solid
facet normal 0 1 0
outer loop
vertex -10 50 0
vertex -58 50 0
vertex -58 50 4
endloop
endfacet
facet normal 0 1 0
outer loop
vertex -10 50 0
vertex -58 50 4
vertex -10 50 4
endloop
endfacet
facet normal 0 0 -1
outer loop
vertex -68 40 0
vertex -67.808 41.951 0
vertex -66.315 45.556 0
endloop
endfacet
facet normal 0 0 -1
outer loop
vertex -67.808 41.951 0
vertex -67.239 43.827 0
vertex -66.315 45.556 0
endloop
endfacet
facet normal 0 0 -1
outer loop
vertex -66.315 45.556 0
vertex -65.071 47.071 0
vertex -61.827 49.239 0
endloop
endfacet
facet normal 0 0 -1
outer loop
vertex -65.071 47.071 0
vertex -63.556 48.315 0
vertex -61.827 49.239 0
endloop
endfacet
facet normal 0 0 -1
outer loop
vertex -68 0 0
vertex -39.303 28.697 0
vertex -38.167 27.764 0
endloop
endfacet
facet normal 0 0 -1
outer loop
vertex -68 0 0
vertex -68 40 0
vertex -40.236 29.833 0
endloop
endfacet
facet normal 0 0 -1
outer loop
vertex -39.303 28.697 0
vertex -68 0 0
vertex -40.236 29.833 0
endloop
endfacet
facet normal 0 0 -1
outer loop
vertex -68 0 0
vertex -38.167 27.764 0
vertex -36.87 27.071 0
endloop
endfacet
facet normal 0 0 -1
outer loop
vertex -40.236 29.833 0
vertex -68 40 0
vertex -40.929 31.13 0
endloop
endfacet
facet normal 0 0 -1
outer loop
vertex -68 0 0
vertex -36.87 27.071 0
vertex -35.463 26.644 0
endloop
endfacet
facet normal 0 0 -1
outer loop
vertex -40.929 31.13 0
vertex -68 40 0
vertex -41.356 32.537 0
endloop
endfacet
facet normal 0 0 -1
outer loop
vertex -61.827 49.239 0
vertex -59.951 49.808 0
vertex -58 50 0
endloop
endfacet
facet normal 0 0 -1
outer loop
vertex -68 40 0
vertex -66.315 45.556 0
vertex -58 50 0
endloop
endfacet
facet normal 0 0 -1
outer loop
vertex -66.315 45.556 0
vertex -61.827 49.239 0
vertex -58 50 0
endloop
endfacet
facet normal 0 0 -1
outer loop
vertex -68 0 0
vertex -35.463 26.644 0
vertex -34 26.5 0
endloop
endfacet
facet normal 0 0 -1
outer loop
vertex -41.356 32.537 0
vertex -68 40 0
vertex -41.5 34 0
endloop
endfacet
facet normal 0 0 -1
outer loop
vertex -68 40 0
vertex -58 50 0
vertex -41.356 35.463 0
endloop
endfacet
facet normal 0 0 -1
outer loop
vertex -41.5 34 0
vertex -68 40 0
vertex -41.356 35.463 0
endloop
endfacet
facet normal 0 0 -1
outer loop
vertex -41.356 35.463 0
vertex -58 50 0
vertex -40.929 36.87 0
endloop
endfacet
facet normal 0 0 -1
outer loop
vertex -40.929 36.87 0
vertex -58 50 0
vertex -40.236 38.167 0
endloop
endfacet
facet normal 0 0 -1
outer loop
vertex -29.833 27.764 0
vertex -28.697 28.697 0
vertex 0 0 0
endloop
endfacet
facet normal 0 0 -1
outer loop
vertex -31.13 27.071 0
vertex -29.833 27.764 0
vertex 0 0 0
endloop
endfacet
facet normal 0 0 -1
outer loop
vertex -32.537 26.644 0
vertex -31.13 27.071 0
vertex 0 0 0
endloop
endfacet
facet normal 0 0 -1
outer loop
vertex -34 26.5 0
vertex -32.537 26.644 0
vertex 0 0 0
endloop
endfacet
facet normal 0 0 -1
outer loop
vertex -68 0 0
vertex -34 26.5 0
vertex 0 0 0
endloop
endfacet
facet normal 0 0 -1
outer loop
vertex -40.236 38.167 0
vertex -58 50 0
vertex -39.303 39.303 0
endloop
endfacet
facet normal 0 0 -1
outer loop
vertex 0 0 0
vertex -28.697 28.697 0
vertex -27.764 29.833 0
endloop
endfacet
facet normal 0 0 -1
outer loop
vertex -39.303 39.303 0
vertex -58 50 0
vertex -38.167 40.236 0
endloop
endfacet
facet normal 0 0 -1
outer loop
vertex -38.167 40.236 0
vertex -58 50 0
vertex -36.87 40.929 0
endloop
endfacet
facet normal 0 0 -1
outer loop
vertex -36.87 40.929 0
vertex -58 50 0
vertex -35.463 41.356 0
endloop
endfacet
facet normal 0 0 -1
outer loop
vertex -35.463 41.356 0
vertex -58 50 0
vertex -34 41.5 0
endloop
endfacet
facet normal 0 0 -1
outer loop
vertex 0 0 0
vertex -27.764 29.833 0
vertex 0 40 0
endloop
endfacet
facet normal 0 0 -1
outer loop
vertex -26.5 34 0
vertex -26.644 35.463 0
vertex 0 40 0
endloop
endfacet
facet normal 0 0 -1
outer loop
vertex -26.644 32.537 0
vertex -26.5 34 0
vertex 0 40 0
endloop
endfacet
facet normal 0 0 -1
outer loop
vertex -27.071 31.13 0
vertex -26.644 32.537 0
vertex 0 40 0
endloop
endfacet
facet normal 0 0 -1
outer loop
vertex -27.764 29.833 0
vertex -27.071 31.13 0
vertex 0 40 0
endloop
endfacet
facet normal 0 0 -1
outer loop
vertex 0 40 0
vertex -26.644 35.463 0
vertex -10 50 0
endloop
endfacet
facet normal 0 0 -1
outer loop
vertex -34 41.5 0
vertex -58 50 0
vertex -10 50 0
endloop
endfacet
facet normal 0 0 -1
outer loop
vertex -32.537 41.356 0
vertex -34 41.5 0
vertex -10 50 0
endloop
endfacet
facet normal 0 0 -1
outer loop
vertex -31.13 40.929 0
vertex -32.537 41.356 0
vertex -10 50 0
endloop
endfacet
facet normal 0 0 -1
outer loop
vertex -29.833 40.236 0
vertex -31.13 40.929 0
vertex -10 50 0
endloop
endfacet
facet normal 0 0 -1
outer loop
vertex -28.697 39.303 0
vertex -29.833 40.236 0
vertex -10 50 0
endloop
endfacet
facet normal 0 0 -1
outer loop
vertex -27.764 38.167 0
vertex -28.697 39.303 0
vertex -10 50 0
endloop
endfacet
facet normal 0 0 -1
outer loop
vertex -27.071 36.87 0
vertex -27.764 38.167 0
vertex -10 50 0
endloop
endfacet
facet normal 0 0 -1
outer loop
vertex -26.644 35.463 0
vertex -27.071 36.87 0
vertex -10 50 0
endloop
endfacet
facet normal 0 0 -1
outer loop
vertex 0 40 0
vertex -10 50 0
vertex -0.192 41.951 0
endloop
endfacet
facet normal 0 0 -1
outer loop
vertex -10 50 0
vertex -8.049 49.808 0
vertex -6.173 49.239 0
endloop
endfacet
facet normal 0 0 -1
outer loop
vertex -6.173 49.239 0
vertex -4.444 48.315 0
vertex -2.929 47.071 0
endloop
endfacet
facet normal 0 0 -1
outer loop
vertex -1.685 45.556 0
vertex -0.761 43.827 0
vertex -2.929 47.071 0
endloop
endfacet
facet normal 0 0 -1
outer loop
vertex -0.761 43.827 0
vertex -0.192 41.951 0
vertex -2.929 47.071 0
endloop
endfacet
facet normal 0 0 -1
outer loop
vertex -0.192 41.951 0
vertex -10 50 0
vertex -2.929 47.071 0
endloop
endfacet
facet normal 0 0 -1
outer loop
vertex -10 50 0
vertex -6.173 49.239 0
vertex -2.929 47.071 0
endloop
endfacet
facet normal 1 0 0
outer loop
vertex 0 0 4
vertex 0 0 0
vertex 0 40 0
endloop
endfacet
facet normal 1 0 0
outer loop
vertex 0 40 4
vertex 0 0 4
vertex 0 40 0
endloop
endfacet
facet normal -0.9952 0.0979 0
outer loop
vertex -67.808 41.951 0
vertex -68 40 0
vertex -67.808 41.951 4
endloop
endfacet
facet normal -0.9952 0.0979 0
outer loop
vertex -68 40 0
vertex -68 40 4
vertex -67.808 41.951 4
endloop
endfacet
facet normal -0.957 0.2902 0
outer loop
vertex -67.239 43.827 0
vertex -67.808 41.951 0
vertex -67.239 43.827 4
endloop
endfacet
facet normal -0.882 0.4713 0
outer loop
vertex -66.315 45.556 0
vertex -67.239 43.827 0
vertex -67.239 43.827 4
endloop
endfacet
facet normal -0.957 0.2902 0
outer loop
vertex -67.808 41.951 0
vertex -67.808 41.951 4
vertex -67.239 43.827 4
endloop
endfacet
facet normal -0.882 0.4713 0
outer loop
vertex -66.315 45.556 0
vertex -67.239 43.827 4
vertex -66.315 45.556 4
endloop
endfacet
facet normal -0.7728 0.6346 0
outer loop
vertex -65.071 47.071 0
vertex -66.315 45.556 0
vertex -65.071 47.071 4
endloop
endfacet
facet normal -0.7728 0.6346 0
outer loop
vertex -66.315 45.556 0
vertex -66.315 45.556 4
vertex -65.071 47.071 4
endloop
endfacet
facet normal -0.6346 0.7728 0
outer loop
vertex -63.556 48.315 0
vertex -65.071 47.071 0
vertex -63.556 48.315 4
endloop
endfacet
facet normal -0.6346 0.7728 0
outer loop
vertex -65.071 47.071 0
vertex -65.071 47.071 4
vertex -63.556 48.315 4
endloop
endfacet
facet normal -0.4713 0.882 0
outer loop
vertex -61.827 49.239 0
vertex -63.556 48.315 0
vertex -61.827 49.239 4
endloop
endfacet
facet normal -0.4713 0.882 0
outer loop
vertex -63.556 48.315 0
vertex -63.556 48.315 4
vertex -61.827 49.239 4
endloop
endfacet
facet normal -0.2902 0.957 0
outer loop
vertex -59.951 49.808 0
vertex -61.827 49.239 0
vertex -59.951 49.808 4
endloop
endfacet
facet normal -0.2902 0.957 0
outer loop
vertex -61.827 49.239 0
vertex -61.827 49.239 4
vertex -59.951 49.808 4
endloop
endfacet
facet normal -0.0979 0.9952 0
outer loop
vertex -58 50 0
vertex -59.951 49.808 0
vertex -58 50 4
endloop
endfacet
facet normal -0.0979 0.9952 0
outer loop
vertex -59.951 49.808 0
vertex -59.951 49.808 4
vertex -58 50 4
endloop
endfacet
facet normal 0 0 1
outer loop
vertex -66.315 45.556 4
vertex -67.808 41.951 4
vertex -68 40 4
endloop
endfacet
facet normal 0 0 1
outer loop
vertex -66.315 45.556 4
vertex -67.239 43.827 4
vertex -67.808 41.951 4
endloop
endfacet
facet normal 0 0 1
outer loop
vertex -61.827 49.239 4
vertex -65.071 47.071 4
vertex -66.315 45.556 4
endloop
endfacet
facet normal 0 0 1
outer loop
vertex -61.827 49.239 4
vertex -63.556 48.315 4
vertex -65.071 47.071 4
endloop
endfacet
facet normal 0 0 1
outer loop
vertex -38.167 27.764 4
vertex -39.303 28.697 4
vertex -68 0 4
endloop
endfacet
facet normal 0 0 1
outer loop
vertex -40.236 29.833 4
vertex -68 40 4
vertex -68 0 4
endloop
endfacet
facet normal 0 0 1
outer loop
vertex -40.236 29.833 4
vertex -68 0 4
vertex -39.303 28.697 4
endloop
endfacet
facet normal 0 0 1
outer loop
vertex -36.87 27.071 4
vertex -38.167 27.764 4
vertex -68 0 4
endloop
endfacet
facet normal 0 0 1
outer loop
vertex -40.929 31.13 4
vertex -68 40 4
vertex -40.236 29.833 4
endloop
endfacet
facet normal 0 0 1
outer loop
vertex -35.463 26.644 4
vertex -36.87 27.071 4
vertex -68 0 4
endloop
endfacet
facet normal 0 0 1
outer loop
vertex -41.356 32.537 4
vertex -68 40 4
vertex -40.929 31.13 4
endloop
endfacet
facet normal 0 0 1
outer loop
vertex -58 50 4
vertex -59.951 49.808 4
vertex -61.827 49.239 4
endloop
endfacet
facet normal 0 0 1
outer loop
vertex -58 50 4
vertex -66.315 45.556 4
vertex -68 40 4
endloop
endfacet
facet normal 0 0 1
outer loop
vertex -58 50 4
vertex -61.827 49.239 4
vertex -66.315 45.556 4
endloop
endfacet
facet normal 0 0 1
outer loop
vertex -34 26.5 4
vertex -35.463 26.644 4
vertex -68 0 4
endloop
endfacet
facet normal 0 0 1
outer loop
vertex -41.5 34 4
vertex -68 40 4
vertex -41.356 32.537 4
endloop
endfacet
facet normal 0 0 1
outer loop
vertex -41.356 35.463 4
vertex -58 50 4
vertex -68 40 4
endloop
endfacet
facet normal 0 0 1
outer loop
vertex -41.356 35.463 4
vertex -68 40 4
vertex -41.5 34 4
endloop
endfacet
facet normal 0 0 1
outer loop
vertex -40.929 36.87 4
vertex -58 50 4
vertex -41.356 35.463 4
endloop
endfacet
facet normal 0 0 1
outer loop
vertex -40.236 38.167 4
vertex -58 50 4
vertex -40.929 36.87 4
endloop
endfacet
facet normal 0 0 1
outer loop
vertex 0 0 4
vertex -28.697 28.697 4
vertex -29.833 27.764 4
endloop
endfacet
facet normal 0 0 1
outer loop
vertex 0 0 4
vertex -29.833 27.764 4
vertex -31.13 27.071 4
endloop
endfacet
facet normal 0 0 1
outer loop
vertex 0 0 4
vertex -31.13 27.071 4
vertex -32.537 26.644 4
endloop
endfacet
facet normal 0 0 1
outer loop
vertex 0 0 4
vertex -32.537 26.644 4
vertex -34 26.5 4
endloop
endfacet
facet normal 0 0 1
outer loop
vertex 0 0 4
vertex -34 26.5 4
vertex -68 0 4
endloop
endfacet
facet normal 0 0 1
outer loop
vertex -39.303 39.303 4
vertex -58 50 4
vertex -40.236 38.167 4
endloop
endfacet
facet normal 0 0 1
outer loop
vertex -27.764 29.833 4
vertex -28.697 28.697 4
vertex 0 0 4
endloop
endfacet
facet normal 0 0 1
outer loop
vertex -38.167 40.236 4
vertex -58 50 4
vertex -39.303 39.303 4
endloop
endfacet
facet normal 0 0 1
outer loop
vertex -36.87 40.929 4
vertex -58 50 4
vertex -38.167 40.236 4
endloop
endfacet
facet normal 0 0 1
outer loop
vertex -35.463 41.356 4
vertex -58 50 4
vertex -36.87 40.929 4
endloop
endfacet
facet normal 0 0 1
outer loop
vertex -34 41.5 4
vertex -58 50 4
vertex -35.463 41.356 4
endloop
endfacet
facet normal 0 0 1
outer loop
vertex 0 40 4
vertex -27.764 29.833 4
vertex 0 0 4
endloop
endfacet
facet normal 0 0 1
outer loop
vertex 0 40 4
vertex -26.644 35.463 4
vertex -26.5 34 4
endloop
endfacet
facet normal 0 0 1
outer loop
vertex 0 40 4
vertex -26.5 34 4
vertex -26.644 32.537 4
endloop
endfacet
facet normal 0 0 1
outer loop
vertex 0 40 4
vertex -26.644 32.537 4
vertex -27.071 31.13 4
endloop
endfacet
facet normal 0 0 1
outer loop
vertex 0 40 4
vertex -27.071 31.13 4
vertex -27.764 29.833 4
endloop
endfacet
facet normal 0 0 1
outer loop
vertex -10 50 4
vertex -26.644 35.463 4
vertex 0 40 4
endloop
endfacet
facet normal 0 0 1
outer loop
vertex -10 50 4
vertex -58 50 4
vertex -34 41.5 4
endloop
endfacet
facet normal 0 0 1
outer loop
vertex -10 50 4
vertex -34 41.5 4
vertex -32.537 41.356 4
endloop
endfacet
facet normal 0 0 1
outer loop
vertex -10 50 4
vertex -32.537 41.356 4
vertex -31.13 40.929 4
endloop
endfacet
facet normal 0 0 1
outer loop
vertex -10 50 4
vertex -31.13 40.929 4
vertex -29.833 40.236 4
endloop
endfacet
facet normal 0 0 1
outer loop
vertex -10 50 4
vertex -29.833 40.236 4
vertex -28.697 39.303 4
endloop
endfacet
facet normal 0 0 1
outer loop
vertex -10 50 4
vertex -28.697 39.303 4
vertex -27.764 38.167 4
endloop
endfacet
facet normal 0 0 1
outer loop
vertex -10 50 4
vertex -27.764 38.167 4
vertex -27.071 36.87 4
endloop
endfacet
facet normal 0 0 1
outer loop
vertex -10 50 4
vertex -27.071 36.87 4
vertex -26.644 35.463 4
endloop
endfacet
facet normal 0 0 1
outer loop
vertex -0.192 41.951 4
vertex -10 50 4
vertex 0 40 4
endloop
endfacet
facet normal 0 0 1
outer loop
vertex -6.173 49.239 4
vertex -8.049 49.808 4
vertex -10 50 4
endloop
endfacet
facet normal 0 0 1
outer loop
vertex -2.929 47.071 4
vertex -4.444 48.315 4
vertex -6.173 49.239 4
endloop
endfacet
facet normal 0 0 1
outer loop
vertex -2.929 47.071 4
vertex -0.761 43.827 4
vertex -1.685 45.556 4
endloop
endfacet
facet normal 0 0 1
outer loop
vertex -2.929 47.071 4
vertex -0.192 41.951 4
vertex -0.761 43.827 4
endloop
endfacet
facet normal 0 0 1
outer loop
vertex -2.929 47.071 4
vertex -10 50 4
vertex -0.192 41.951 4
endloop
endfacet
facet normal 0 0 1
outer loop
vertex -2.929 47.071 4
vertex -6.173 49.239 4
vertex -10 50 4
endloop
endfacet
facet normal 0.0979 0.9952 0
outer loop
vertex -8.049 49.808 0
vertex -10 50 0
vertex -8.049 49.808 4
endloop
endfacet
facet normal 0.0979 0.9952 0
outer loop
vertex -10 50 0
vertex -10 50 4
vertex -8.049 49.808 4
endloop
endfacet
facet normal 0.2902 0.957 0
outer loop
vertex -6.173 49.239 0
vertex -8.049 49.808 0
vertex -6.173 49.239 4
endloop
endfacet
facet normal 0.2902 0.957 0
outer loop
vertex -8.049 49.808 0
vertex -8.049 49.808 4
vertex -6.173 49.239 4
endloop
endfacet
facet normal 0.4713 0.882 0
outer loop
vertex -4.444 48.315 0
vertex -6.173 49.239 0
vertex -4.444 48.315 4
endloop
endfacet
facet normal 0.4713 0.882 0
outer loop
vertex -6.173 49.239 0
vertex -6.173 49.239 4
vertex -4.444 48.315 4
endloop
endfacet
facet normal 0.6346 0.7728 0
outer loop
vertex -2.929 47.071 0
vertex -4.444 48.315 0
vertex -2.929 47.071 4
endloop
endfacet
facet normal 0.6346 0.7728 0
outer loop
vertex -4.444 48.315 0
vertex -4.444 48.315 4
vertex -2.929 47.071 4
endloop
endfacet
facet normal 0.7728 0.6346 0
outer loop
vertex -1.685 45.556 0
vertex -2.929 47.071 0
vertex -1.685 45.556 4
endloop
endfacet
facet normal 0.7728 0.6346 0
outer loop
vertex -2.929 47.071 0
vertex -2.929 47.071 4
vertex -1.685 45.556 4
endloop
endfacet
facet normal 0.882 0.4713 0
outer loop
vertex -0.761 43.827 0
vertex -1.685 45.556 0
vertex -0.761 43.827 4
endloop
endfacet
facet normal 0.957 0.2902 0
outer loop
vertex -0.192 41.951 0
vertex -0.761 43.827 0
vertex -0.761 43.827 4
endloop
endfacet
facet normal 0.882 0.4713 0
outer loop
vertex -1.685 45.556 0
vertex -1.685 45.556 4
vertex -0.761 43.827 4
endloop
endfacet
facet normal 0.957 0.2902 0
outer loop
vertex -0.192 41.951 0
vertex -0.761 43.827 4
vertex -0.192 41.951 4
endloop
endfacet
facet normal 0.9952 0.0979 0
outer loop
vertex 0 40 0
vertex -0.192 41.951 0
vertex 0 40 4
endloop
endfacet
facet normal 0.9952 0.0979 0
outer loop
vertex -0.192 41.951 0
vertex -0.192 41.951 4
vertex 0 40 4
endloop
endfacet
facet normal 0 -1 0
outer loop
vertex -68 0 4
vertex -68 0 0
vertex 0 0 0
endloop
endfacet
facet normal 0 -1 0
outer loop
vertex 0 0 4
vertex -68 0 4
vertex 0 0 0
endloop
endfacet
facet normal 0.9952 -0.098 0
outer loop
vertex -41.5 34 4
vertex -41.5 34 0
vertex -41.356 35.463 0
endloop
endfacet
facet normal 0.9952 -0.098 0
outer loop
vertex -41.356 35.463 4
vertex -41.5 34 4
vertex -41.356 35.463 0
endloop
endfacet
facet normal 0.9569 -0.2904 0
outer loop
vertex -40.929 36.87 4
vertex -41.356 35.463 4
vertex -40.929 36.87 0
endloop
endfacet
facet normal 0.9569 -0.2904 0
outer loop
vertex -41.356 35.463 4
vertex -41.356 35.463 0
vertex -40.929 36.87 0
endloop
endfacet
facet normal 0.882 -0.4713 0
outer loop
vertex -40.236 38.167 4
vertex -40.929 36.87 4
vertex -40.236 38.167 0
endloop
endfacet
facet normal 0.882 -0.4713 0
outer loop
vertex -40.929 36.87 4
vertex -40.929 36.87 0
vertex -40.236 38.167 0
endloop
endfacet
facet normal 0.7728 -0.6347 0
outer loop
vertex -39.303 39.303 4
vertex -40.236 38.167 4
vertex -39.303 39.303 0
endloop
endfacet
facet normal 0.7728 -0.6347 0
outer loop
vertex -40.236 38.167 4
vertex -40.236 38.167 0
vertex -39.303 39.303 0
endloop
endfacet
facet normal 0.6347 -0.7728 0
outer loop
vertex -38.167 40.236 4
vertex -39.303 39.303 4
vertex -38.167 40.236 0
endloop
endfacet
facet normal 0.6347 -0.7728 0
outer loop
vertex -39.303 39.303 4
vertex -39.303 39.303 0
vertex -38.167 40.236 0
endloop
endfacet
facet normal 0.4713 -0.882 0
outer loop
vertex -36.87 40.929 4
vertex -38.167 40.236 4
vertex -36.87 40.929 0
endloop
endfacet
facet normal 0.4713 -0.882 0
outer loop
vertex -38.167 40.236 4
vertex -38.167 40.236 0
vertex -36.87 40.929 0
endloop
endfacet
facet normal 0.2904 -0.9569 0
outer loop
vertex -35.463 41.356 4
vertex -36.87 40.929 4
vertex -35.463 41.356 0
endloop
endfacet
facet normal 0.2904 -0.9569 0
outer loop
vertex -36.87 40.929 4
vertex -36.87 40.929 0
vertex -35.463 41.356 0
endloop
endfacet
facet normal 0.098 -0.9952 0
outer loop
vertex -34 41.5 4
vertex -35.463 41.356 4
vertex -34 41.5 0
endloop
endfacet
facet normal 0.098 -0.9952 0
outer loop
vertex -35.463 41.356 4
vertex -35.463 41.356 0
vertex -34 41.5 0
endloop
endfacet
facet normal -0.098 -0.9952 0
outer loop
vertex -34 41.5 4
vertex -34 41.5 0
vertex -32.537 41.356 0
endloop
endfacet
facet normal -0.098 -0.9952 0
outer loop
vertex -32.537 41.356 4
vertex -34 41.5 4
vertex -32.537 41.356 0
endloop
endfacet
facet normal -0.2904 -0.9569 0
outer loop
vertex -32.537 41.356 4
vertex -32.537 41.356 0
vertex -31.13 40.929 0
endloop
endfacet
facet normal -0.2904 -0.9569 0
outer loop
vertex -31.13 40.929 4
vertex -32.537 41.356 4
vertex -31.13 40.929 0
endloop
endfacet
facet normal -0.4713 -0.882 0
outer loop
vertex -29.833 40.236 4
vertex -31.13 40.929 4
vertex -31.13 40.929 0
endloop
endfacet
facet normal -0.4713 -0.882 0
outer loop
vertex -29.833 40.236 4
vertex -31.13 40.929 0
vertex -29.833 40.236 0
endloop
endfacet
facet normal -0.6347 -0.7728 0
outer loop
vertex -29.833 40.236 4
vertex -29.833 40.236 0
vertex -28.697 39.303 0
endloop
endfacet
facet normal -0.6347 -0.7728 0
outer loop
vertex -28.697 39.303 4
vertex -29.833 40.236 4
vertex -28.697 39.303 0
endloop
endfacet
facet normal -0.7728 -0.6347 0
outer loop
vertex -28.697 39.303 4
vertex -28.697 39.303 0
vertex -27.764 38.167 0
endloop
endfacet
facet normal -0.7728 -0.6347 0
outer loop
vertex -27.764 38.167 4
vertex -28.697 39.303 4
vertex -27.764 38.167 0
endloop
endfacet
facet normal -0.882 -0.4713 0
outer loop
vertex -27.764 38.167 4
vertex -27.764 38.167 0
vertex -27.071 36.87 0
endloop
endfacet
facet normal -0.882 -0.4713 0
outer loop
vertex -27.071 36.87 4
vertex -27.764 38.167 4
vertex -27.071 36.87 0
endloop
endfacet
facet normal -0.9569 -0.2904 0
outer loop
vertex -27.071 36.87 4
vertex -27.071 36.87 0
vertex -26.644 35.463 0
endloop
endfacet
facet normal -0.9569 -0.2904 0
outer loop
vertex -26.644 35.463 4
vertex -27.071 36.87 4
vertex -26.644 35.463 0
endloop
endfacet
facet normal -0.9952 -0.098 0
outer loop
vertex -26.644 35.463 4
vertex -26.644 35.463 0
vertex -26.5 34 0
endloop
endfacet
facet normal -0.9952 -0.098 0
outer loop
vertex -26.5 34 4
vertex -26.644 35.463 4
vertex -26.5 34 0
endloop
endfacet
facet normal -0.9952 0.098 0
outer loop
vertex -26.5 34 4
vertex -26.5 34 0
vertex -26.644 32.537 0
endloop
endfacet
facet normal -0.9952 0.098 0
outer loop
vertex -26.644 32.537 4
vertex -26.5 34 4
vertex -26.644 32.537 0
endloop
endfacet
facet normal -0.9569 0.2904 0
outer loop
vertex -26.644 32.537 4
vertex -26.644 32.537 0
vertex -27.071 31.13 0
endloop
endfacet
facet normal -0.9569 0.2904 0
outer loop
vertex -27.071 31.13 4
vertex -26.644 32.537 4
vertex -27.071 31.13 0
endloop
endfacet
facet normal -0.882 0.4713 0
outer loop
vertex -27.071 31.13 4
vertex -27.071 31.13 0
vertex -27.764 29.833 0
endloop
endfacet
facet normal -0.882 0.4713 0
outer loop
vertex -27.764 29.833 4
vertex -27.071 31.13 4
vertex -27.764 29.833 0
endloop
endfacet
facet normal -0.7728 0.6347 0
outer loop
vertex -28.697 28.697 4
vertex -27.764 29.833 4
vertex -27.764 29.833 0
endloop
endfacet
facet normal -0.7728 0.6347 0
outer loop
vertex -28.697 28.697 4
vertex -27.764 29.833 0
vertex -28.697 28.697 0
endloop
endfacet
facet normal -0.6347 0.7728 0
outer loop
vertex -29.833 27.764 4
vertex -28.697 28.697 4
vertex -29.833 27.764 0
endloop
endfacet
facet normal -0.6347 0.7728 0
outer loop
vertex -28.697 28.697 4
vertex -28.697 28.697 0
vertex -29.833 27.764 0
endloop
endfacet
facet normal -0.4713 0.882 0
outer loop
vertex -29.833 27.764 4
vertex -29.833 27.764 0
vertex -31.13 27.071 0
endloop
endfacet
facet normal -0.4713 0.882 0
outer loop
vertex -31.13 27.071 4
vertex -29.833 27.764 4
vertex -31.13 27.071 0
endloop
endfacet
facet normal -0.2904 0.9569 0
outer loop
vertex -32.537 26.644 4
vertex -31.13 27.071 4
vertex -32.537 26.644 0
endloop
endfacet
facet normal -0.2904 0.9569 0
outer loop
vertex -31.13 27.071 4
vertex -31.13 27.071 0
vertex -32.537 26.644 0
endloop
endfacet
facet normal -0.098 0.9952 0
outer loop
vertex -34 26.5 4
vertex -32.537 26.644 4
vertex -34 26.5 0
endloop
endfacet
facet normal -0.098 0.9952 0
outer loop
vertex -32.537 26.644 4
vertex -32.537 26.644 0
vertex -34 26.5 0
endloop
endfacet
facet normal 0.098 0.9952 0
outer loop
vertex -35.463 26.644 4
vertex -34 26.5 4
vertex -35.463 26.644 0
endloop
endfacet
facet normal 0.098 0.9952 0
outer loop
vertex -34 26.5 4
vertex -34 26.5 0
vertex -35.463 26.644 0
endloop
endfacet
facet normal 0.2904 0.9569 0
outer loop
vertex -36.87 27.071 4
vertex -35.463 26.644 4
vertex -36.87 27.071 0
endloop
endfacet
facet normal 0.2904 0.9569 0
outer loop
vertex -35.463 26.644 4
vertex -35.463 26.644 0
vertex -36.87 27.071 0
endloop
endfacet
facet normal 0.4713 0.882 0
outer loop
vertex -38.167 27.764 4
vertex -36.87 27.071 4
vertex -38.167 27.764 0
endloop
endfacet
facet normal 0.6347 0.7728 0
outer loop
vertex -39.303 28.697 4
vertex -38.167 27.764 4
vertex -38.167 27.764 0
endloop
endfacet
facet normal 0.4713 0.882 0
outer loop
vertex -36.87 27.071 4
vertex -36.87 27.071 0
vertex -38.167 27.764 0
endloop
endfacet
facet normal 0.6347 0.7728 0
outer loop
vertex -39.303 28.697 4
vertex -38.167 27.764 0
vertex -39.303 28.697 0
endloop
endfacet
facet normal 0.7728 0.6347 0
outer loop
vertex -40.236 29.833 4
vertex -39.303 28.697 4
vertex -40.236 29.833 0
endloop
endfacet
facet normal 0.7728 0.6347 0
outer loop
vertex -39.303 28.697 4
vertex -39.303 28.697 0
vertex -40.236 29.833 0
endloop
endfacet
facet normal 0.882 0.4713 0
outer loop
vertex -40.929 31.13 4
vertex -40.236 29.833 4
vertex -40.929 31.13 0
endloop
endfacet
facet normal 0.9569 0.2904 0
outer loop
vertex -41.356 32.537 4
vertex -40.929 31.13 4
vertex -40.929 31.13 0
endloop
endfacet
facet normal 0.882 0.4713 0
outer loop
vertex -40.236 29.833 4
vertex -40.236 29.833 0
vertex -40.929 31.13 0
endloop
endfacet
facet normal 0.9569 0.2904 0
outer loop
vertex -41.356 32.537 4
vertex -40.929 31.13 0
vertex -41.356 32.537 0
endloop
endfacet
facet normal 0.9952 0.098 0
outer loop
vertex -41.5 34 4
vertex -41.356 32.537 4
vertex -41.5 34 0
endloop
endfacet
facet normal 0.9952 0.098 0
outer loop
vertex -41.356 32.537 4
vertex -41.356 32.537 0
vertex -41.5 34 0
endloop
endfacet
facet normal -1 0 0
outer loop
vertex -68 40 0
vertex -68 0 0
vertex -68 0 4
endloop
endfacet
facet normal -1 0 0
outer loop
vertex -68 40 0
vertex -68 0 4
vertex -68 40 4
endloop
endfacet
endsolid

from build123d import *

# Parameters (mm, degrees)
SKETCH1_W           = 68
SKETCH1_H           = 50
BOSS_EXTRUDE1_DEPTH = 4
SKETCH4_R           = 7.5
CUT_EXTRUDE1_DEPTH  = 10
FILLET1_R           = 10


with BuildPart() as part:
    # Sketch1 → Boss-Extrude1 (new body)
    with BuildSketch(Plane.XY):
        with Locations((-34, 25)):
            Rectangle(SKETCH1_W, SKETCH1_H)
    extrude(amount=BOSS_EXTRUDE1_DEPTH)

    # Sketch4 → Cut-Extrude1 (cut)
    with BuildSketch(Plane(origin=(0, 0, 0), x_dir=(-1, 0, 0), z_dir=(0, 0, -1))):
        with Locations((34, 34)):
            Circle(SKETCH4_R)
    extrude(amount=-CUT_EXTRUDE1_DEPTH, mode=Mode.SUBTRACT)

    # Fillet1
    fillet1_edges = [part.edges().sort_by_distance(p)[0] for p in [
        (-68, 50, 2),
        (0, 50, 2),
    ]]
    fillet(fillet1_edges, radius=FILLET1_R)


solid = part.part
